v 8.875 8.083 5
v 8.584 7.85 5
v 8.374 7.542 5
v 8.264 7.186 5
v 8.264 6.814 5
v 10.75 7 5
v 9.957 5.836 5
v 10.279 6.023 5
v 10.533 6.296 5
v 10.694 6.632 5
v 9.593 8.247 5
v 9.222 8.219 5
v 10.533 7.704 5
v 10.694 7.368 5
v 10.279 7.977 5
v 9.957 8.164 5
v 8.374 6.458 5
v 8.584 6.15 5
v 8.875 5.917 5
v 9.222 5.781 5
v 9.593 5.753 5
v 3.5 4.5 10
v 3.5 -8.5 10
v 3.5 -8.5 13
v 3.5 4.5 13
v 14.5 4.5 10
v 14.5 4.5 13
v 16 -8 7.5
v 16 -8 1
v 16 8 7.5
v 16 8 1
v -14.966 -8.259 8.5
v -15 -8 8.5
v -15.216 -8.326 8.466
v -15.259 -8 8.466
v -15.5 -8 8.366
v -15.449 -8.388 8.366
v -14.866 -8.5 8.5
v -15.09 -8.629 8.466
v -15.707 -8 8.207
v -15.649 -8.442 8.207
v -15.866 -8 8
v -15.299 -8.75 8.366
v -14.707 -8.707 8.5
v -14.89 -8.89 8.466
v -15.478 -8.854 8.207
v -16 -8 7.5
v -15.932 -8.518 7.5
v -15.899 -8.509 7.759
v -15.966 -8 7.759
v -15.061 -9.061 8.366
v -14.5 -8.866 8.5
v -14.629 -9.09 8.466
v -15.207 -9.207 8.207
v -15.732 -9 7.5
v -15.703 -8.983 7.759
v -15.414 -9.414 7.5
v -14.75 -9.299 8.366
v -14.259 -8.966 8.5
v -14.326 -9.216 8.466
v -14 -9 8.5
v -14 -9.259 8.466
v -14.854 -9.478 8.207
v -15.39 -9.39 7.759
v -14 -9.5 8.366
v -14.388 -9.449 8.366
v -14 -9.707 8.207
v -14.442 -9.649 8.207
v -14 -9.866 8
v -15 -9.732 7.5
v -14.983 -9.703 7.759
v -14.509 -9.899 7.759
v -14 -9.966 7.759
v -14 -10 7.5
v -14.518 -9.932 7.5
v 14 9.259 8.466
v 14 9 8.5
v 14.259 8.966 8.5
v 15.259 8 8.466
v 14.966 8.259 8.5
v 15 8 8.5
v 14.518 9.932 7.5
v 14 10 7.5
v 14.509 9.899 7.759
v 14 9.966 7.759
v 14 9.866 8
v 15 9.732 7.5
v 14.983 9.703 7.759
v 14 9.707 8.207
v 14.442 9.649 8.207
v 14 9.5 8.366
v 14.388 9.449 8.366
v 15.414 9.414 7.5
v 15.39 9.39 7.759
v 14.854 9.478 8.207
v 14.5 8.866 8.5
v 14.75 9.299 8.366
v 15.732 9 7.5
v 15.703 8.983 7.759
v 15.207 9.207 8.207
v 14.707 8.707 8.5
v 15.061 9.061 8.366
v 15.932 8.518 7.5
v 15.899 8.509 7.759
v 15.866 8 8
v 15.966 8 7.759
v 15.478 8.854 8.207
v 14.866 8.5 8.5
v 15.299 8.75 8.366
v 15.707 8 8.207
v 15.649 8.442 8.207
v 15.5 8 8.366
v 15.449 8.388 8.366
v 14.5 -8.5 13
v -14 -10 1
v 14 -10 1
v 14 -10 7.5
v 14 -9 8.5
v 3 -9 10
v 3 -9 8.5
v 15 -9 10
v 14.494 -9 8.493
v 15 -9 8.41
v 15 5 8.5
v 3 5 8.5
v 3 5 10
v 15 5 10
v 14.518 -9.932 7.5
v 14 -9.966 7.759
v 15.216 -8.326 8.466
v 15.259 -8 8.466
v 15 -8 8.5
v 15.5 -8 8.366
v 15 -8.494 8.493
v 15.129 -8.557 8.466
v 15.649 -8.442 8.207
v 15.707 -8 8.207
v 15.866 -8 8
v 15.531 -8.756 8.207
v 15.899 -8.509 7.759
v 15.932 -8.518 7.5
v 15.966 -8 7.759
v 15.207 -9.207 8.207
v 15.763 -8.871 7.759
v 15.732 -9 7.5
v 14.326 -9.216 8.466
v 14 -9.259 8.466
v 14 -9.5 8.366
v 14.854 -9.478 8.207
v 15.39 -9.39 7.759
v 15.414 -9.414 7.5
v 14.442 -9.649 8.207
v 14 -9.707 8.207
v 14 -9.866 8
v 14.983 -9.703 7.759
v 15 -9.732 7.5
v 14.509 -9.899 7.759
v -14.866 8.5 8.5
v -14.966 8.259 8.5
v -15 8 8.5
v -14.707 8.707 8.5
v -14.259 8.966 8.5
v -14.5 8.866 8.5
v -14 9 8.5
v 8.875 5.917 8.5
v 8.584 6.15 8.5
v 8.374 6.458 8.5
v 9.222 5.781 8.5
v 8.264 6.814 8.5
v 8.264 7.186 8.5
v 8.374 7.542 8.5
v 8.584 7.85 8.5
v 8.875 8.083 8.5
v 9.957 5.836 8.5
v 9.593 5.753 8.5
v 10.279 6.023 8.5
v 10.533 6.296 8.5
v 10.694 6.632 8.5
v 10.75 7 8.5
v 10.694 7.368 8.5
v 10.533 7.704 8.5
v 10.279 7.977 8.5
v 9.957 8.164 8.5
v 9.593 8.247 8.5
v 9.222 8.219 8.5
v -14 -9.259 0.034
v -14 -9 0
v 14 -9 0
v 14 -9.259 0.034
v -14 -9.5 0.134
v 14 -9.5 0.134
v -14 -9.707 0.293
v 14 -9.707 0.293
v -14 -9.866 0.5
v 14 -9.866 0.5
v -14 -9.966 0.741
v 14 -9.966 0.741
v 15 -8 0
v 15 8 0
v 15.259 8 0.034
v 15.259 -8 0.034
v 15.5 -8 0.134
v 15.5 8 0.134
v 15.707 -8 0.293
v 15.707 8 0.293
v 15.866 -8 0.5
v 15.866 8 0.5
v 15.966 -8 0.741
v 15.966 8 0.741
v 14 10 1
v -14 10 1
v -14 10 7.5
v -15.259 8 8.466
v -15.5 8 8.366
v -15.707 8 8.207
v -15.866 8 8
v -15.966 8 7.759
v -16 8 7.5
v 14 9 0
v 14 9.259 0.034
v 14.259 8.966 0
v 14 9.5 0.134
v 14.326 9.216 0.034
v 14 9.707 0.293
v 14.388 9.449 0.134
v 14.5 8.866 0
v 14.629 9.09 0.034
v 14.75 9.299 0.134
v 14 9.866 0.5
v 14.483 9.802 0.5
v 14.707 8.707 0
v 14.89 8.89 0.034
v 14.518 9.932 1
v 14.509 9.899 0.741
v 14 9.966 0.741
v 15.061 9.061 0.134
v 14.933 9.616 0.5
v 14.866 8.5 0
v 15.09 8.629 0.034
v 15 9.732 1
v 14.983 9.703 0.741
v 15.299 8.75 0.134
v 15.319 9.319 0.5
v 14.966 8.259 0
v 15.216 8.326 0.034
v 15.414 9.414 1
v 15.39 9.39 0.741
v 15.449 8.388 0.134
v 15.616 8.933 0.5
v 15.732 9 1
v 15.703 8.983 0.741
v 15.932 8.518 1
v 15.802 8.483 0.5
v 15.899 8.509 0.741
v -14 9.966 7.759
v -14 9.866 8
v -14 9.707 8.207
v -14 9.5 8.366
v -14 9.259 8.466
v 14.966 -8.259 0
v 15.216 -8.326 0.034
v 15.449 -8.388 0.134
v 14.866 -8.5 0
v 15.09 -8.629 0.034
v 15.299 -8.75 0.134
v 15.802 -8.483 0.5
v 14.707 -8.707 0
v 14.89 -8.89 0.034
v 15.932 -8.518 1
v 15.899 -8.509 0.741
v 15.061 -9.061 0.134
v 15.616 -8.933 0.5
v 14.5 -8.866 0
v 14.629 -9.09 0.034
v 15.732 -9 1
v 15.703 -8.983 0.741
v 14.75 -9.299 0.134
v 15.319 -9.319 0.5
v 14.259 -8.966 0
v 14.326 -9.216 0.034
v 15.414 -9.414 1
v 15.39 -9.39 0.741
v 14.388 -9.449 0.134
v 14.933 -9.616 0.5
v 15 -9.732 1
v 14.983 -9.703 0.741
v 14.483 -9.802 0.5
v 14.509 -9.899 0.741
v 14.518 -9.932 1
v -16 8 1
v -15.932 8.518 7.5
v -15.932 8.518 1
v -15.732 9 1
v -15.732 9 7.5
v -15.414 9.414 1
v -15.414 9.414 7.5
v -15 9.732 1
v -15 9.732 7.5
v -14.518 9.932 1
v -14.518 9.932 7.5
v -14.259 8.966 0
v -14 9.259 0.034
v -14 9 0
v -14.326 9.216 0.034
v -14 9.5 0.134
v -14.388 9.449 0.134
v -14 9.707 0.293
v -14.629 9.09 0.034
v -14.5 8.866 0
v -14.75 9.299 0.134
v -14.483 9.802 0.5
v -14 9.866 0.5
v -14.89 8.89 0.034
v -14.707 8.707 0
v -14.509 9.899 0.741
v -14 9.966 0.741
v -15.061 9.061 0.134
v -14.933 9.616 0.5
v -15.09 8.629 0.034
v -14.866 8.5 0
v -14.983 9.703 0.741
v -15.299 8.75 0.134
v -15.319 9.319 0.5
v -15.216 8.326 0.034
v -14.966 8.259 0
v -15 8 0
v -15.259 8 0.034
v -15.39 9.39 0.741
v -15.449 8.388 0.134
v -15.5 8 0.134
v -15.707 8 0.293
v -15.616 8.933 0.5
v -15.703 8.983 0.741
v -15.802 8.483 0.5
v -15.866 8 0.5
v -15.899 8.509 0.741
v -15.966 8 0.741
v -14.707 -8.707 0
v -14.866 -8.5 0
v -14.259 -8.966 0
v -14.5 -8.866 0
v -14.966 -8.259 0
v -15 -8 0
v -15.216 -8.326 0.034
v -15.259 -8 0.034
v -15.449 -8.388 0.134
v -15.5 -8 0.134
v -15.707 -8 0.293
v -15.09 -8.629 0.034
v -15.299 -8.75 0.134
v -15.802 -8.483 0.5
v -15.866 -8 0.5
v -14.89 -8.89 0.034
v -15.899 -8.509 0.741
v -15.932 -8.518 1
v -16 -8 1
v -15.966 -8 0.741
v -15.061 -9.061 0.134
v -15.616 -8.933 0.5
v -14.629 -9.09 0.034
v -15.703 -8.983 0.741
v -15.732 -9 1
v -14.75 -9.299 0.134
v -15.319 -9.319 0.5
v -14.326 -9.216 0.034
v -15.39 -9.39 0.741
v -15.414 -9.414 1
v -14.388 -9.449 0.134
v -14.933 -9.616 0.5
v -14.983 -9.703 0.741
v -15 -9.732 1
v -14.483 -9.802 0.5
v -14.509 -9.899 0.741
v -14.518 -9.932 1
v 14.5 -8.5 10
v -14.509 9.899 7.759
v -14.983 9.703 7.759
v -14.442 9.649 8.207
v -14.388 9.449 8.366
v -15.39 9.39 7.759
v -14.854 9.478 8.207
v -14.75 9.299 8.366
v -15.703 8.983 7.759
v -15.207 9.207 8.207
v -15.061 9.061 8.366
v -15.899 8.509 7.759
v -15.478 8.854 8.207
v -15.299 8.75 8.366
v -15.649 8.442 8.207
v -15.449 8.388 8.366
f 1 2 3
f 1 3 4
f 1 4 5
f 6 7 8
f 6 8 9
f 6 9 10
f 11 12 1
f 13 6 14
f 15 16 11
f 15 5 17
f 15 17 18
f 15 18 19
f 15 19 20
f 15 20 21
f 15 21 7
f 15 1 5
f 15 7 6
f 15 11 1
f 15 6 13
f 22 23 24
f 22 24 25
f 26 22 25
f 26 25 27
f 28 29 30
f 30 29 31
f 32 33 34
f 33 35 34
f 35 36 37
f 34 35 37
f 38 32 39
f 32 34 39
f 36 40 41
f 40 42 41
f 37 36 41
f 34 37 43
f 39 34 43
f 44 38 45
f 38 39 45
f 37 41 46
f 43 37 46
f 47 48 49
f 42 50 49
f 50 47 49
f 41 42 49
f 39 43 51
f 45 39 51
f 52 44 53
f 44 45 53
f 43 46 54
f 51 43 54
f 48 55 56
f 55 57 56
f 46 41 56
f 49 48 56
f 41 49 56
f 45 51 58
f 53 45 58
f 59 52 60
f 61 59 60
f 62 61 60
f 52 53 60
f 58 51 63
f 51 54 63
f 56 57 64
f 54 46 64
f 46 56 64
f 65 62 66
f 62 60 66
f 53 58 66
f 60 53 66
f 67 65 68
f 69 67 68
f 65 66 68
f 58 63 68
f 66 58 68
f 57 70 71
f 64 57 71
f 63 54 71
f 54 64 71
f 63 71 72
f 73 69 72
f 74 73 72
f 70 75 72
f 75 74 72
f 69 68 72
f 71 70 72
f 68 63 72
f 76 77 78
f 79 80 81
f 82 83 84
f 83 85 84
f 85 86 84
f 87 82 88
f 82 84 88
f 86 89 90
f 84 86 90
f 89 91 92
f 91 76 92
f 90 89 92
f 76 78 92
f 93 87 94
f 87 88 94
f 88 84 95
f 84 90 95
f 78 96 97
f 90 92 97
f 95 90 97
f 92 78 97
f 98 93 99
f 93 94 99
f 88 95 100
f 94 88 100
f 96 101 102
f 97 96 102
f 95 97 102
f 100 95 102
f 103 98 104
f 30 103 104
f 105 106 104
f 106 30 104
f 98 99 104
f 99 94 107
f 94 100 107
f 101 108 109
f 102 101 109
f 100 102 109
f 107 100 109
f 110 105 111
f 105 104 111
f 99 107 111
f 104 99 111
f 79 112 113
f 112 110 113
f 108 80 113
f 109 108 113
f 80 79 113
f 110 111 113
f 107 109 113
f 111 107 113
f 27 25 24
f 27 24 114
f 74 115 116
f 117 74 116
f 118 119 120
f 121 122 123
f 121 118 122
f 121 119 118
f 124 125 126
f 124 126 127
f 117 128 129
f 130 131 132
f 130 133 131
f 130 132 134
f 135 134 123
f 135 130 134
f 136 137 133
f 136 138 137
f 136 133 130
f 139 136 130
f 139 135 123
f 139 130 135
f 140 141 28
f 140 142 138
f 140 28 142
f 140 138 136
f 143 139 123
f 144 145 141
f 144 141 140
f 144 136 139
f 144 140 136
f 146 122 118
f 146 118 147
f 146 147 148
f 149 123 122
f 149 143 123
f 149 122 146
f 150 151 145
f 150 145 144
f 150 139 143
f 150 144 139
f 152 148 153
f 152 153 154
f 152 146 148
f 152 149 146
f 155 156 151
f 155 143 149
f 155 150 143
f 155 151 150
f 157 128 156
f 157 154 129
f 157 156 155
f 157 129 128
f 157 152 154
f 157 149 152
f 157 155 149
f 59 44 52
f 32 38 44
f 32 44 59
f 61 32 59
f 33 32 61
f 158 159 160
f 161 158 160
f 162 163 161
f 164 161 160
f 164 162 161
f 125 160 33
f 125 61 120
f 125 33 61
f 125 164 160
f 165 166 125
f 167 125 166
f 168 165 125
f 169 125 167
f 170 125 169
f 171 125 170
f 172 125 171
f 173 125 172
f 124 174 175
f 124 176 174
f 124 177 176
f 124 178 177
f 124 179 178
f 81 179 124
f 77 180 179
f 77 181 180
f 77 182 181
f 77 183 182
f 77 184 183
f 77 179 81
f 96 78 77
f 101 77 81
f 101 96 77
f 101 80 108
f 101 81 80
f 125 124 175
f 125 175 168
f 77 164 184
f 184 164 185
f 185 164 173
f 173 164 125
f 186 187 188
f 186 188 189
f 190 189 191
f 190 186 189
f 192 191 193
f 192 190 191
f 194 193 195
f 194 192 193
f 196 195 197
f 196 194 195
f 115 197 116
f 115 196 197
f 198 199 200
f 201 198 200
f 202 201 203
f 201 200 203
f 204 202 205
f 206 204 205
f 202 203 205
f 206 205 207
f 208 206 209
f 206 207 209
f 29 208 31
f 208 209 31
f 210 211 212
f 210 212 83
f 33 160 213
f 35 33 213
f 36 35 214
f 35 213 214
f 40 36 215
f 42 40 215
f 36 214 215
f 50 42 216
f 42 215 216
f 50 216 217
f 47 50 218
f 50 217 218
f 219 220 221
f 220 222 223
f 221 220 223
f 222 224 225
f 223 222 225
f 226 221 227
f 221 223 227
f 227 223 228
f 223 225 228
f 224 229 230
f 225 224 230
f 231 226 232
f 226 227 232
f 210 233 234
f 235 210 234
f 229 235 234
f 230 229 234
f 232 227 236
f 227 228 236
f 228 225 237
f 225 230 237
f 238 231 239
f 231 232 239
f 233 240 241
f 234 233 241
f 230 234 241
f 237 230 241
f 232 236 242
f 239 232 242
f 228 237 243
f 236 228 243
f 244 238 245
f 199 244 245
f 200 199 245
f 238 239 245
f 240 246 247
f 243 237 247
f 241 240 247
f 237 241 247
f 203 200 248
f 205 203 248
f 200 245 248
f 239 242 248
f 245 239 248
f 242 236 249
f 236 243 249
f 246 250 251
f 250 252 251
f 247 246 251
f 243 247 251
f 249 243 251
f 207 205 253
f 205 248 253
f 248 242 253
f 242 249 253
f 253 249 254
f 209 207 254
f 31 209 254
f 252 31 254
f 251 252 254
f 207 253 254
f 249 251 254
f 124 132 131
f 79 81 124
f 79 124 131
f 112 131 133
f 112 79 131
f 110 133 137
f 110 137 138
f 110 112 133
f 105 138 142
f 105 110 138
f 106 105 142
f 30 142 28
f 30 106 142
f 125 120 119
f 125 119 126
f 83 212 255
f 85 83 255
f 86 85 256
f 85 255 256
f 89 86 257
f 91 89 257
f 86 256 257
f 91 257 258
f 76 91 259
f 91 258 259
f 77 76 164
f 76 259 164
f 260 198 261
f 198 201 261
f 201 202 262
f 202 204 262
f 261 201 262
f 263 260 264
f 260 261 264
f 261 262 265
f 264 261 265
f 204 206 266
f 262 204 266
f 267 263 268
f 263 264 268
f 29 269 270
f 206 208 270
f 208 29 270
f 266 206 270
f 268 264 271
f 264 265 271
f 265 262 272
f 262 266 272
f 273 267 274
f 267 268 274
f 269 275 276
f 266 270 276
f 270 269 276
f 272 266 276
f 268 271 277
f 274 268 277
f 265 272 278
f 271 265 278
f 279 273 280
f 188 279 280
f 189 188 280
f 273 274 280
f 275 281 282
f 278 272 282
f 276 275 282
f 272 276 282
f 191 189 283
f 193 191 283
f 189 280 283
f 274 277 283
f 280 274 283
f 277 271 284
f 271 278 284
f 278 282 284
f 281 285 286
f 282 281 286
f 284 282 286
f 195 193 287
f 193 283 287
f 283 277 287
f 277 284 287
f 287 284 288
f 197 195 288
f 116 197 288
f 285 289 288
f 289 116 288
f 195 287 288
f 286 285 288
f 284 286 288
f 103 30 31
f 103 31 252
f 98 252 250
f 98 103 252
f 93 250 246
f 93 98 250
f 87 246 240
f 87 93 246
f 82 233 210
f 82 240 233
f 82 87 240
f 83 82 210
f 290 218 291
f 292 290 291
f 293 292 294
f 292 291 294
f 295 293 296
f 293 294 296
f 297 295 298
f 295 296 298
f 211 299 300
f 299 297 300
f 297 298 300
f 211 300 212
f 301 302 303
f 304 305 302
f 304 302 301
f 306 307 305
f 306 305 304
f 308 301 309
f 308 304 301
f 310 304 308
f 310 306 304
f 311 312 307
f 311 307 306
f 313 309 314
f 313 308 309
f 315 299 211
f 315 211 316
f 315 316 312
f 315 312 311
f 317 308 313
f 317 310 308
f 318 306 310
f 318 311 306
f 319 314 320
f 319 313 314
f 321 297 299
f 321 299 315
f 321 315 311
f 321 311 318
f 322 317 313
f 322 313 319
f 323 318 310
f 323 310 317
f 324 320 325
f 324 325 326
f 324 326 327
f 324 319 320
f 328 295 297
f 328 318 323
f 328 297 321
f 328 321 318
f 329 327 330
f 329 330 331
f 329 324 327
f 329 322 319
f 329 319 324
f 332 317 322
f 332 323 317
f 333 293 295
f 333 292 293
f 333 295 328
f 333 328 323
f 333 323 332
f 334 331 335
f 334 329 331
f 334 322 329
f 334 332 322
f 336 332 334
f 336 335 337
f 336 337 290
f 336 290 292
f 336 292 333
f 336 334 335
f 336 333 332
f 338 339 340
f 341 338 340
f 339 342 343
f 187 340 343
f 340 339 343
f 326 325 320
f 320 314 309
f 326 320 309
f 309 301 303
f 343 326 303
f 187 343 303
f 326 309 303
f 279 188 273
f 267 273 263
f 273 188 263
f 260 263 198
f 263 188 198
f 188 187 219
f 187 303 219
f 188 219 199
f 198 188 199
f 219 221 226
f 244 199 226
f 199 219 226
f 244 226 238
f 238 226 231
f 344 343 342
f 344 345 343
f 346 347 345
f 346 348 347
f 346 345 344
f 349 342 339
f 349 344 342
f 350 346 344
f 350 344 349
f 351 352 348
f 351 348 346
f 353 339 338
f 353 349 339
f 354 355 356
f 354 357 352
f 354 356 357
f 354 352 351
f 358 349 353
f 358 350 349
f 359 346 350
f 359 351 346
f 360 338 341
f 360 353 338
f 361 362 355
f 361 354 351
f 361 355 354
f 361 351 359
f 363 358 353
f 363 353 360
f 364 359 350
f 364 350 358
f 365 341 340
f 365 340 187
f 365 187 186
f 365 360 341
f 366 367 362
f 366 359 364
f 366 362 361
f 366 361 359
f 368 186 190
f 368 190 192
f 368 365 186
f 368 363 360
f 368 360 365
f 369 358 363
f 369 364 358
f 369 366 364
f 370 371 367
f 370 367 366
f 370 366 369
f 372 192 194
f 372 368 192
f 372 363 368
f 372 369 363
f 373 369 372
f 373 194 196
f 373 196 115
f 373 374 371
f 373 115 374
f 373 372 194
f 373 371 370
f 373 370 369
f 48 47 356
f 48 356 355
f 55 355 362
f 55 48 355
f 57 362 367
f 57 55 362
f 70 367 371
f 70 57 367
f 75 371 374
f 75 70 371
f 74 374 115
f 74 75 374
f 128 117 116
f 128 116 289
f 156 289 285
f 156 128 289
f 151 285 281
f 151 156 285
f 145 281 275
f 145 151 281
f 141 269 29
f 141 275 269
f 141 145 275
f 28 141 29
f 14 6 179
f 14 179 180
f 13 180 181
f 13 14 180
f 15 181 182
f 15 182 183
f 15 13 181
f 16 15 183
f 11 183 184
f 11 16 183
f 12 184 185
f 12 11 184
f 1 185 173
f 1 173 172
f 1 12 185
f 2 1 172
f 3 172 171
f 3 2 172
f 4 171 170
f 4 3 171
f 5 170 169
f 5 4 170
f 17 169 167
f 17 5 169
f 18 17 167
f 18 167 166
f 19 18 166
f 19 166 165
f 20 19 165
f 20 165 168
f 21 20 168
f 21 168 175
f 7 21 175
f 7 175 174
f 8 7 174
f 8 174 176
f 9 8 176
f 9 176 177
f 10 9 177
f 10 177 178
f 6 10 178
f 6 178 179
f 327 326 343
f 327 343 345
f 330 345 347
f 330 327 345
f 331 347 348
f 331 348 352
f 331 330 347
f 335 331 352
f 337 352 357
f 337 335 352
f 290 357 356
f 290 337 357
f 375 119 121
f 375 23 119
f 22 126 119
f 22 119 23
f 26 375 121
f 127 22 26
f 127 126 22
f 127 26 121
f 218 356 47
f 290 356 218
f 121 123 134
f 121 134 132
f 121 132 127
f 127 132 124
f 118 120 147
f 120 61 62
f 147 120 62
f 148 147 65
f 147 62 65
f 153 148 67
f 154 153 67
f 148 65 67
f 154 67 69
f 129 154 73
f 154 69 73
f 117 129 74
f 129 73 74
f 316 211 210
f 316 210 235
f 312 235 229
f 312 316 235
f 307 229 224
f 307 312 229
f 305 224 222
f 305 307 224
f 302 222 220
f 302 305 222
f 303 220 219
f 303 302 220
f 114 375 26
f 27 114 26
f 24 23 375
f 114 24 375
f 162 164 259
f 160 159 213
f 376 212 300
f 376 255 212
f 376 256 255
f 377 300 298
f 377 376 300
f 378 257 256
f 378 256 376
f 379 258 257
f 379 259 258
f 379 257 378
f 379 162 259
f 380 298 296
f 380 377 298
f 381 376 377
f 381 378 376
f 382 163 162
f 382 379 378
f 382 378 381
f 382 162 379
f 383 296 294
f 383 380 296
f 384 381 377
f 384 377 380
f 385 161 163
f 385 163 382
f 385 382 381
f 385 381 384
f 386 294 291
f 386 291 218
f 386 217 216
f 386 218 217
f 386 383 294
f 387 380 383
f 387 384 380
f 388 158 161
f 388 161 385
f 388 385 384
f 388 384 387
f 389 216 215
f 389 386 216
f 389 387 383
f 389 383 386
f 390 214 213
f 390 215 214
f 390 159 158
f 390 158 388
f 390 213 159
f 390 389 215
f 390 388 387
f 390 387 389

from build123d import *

# Parameters (mm, degrees)
F0_W         = 32
F0_H         = 20
F0_W_2       = 12
F0_H_2       = 14
F0_R         = 1.25
F0_W_3       = 11
F0_H_3       = 13
F1_DEPTH     = 8.5
F2_DEPTH     = 5
F3_R         = 2
F4_DEPTH     = 13
F5_DEPTH     = 10
F6_T1_DEPTH  = 28
F6_T3_DEPTH  = 16
F6_T6_ANGLE  = 90
F6_T8_ANGLE  = 90
F6_T10_ANGLE = 90
F6_T12_ANGLE = 90
F6_T14_ANGLE = 90
F6_T16_ANGLE = 90
F6_T20_ANGLE = 90
F6_T26_ANGLE = 90
F6_T32_ANGLE = 90
F6_T36_ANGLE = 90


# Not quite as in the source:
# - a fillet or chamfer that OpenCascade refuses, or shapes differently, is made with other operations: its cross-section is extruded or revolved along the edge and cut away or added


with BuildPart() as f1:
    # F0 (on Top) → F1 (new body)
    with BuildSketch(Plane.XY):
        Rectangle(F0_W, F0_H)
        with Locations((9, -2)):
            Rectangle(F0_W_2, F0_H_2, mode=Mode.SUBTRACT)
        with Locations((9.5, 7)):
            Circle(F0_R, mode=Mode.SUBTRACT)
        with Locations((9, -2)):
            Rectangle(F0_W_2, F0_H_2)
        with Locations((9, -2)):
            Rectangle(F0_W_3, F0_H_3, mode=Mode.SUBTRACT)
        with Locations((9, -2)):
            Rectangle(F0_W_3, F0_H_3)
    extrude(amount=F1_DEPTH)

    # F0 (on Top) → F2 (join)
    with BuildSketch(Plane.XY):
        with Locations((9.5, 7)):
            Circle(F0_R)
    extrude(amount=F2_DEPTH)

    # F3
    f3_edges = [f1.edges().sort_by_distance(p)[0] for p in [
        (-16, 10, 4.25),
        (-16, -10, 4.25),
        (16, -10, 4.25),
        (16, 10, 4.25),
    ]]
    fillet(f3_edges, radius=F3_R)

    # F0 (on Top) → F4 (join)
    with BuildSketch(Plane.XY):
        with Locations((9, -2)):
            Rectangle(F0_W_3, F0_H_3)
    extrude(amount=F4_DEPTH)

    # F0 (on Top) → F5 (join)
    with BuildSketch(Plane.XY):
        with Locations((9, -2)):
            Rectangle(F0_W_2, F0_H_2)
        with Locations((9, -2)):
            Rectangle(F0_W_3, F0_H_3, mode=Mode.SUBTRACT)
    extrude(amount=F5_DEPTH)

    # F6: fillet of radius 1 on 18 edges, made by hand

    # F6_s2 → F6_t1 (cut)
    with BuildSketch(Plane.YZ.offset(-14)):
        with BuildLine():
            ThreePointArc((-9, 0), (-9.7071067812, 0.2928932188), (-10, 1))
            Line((-10, 1), (-10, 0))
            Line((-10, 0), (-9, 0))
        make_face()
        with BuildLine():
            ThreePointArc((-9, 8.5), (-9.7071067812, 8.2071067812), (-10, 7.5))
            Line((-10, 7.5), (-10, 8.5))
            Line((-10, 8.5), (-9, 8.5))
        make_face()
        with BuildLine():
            ThreePointArc((10, 1), (9.7071067812, 0.2928932188), (9, 0))
            Line((9, 0), (10, 0))
            Line((10, 0), (10, 1))
        make_face()
        with BuildLine():
            ThreePointArc((10, 7.5), (9.7071067812, 8.2071067812), (9, 8.5))
            Line((9, 8.5), (10, 8.5))
            Line((10, 8.5), (10, 7.5))
        make_face()
    extrude(amount=F6_T1_DEPTH, mode=Mode.SUBTRACT)

    # F6_s4 → F6_t3 (cut)
    with BuildSketch(Plane.XZ.offset(-8)):
        with BuildLine():
            ThreePointArc((-15, 0), (-15.7071067812, 0.2928932188), (-16, 1))
            Line((-16, 1), (-16, 0))
            Line((-16, 0), (-15, 0))
        make_face()
        with BuildLine():
            ThreePointArc((15, 0), (15.7071067812, 0.2928932188), (16, 1))
            Line((16, 1), (16, 0))
            Line((16, 0), (15, 0))
        make_face()
        with BuildLine():
            ThreePointArc((15, 8.5), (15.7071067812, 8.2071067812), (16, 7.5))
            Line((16, 7.5), (16, 8.5))
            Line((16, 8.5), (15, 8.5))
        make_face()
        with BuildLine():
            ThreePointArc((-15, 8.5), (-15.7071067812, 8.2071067812), (-16, 7.5))
            Line((-16, 7.5), (-16, 8.5))
            Line((-16, 8.5), (-15, 8.5))
        make_face()
    extrude(amount=F6_T3_DEPTH, mode=Mode.SUBTRACT)

    # F6_s5 → F6_t6 (revolve, cut)
    with BuildSketch(Plane.YZ.offset(-14)):
        with BuildLine():
            ThreePointArc((9, 0), (9.7071067812, 0.2928932188), (10, 1))
            Line((10, 1), (10, 0))
            Line((10, 0), (9, 0))
        make_face()
    revolve(axis=Axis((-14, 8, 0), (0, 0, 1)), revolution_arc=F6_T6_ANGLE, mode=Mode.SUBTRACT)

    # F6_s7 → F6_t8 (revolve, cut)
    with BuildSketch(Plane.XZ.offset(8)):
        with BuildLine():
            ThreePointArc((-15, 0), (-15.7071067812, 0.2928932188), (-16, 1))
            Line((-16, 1), (-16, 0))
            Line((-16, 0), (-15, 0))
        make_face()
    revolve(axis=Axis((-14, -8, 0), (0, 0, 1)), revolution_arc=F6_T8_ANGLE, mode=Mode.SUBTRACT)

    # F6_s9 → F6_t10 (revolve, cut)
    with BuildSketch(Plane.XZ.offset(8)):
        with BuildLine():
            ThreePointArc((15, 0), (15.7071067812, 0.2928932188), (16, 1))
            Line((16, 1), (16, 0))
            Line((16, 0), (15, 0))
        make_face()
    revolve(axis=Axis((14, -8, 0), (0, 0, -1)), revolution_arc=F6_T10_ANGLE, mode=Mode.SUBTRACT)

    # F6_s11 → F6_t12 (revolve, cut)
    with BuildSketch(Plane.YZ.offset(14)):
        with BuildLine():
            ThreePointArc((9, 0), (9.7071067812, 0.2928932188), (10, 1))
            Line((10, 1), (10, 0))
            Line((10, 0), (9, 0))
        make_face()
    revolve(axis=Axis((14, 8, 0), (0, 0, -1)), revolution_arc=F6_T12_ANGLE, mode=Mode.SUBTRACT)

    # F6_s13 → F6_t14 (revolve, cut)
    with BuildSketch(Plane.YZ.offset(14)):
        with BuildLine():
            ThreePointArc((10, 7.5), (9.7071067812, 8.2071067812), (9, 8.5))
            Line((9, 8.5), (10, 8.5))
            Line((10, 8.5), (10, 7.5))
        make_face()
    revolve(axis=Axis((14, 8, 8.5), (0, 0, -1)), revolution_arc=F6_T14_ANGLE, mode=Mode.SUBTRACT)

    # F6_s15 → F6_t16 (revolve, cut)
    with BuildSketch(Plane.YZ.offset(-14)):
        with BuildLine():
            ThreePointArc((10, 7.5), (9.7071067812, 8.2071067812), (9, 8.5))
            Line((9, 8.5), (10, 8.5))
            Line((10, 8.5), (10, 7.5))
        make_face()
    revolve(axis=Axis((-14, 8, 8.5), (0, 0, 1)), revolution_arc=F6_T16_ANGLE, mode=Mode.SUBTRACT)


with BuildPart() as f6_tool18:
    # F6_s19 → F6_t20 (revolve)
    with BuildSketch(Plane.XZ.offset(8)):
        with BuildLine():
            ThreePointArc((15, 8.5), (15.7071067812, 8.2071067812), (16, 7.5))
            Line((16, 7.5), (16, 8.5))
            Line((16, 8.5), (15, 8.5))
        make_face()
    revolve(axis=Axis((14, -8, 8.5), (0, 0, -1)), revolution_arc=F6_T20_ANGLE)

    split(bisect_by=Plane.YZ.offset(15), keep=Keep.TOP)

    split(bisect_by=Plane.XZ.offset(9), keep=Keep.BOTTOM)


with BuildPart() as f1_1:
    add(f1.part)

    # F6_t17: cut F6_tool18
    add(f6_tool18.part, mode=Mode.SUBTRACT)


with BuildPart() as f6_tool24:
    # F6_s25 → F6_t26 (revolve)
    with BuildSketch(Plane.XZ.offset(8)):
        with BuildLine():
            ThreePointArc((15, 8.5), (15.7071067812, 8.2071067812), (16, 7.5))
            Line((16, 7.5), (16, 8.5))
            Line((16, 8.5), (15, 8.5))
        make_face()
    revolve(axis=Axis((14, -8, 8.5), (0, 0, -1)), revolution_arc=F6_T26_ANGLE)

    split(bisect_by=Plane.YZ.offset(15), keep=Keep.BOTTOM)

    split(bisect_by=Plane.XZ.offset(9), keep=Keep.TOP)


with BuildPart() as f1_2:
    add(f1_1.part)

    # F6_t23: cut F6_tool24
    add(f6_tool24.part, mode=Mode.SUBTRACT)


with BuildPart() as f6_tool30:
    # F6_s31 → F6_t32 (revolve)
    with BuildSketch(Plane.XZ.offset(8)):
        with BuildLine():
            ThreePointArc((15, 8.5), (15.7071067812, 8.2071067812), (16, 7.5))
            Line((16, 7.5), (16, 8.5))
            Line((16, 8.5), (15, 8.5))
        make_face()
    revolve(axis=Axis((14, -8, 8.5), (0, 0, -1)), revolution_arc=F6_T32_ANGLE)

    split(bisect_by=Plane.YZ.offset(15), keep=Keep.TOP)

    split(bisect_by=Plane.XZ.offset(9), keep=Keep.TOP)


with BuildPart() as f1_3:
    add(f1_2.part)

    # F6_t29: cut F6_tool30
    add(f6_tool30.part, mode=Mode.SUBTRACT)

    # F6_s35 → F6_t36 (revolve, cut)
    with BuildSketch(Plane.XZ.offset(8)):
        with BuildLine():
            ThreePointArc((-15, 8.5), (-15.7071067812, 8.2071067812), (-16, 7.5))
            Line((-16, 7.5), (-16, 8.5))
            Line((-16, 8.5), (-15, 8.5))
        make_face()
    revolve(axis=Axis((-14, -8, 8.5), (0, 0, 1)), revolution_arc=F6_T36_ANGLE, mode=Mode.SUBTRACT)


solid = f1_3.part
